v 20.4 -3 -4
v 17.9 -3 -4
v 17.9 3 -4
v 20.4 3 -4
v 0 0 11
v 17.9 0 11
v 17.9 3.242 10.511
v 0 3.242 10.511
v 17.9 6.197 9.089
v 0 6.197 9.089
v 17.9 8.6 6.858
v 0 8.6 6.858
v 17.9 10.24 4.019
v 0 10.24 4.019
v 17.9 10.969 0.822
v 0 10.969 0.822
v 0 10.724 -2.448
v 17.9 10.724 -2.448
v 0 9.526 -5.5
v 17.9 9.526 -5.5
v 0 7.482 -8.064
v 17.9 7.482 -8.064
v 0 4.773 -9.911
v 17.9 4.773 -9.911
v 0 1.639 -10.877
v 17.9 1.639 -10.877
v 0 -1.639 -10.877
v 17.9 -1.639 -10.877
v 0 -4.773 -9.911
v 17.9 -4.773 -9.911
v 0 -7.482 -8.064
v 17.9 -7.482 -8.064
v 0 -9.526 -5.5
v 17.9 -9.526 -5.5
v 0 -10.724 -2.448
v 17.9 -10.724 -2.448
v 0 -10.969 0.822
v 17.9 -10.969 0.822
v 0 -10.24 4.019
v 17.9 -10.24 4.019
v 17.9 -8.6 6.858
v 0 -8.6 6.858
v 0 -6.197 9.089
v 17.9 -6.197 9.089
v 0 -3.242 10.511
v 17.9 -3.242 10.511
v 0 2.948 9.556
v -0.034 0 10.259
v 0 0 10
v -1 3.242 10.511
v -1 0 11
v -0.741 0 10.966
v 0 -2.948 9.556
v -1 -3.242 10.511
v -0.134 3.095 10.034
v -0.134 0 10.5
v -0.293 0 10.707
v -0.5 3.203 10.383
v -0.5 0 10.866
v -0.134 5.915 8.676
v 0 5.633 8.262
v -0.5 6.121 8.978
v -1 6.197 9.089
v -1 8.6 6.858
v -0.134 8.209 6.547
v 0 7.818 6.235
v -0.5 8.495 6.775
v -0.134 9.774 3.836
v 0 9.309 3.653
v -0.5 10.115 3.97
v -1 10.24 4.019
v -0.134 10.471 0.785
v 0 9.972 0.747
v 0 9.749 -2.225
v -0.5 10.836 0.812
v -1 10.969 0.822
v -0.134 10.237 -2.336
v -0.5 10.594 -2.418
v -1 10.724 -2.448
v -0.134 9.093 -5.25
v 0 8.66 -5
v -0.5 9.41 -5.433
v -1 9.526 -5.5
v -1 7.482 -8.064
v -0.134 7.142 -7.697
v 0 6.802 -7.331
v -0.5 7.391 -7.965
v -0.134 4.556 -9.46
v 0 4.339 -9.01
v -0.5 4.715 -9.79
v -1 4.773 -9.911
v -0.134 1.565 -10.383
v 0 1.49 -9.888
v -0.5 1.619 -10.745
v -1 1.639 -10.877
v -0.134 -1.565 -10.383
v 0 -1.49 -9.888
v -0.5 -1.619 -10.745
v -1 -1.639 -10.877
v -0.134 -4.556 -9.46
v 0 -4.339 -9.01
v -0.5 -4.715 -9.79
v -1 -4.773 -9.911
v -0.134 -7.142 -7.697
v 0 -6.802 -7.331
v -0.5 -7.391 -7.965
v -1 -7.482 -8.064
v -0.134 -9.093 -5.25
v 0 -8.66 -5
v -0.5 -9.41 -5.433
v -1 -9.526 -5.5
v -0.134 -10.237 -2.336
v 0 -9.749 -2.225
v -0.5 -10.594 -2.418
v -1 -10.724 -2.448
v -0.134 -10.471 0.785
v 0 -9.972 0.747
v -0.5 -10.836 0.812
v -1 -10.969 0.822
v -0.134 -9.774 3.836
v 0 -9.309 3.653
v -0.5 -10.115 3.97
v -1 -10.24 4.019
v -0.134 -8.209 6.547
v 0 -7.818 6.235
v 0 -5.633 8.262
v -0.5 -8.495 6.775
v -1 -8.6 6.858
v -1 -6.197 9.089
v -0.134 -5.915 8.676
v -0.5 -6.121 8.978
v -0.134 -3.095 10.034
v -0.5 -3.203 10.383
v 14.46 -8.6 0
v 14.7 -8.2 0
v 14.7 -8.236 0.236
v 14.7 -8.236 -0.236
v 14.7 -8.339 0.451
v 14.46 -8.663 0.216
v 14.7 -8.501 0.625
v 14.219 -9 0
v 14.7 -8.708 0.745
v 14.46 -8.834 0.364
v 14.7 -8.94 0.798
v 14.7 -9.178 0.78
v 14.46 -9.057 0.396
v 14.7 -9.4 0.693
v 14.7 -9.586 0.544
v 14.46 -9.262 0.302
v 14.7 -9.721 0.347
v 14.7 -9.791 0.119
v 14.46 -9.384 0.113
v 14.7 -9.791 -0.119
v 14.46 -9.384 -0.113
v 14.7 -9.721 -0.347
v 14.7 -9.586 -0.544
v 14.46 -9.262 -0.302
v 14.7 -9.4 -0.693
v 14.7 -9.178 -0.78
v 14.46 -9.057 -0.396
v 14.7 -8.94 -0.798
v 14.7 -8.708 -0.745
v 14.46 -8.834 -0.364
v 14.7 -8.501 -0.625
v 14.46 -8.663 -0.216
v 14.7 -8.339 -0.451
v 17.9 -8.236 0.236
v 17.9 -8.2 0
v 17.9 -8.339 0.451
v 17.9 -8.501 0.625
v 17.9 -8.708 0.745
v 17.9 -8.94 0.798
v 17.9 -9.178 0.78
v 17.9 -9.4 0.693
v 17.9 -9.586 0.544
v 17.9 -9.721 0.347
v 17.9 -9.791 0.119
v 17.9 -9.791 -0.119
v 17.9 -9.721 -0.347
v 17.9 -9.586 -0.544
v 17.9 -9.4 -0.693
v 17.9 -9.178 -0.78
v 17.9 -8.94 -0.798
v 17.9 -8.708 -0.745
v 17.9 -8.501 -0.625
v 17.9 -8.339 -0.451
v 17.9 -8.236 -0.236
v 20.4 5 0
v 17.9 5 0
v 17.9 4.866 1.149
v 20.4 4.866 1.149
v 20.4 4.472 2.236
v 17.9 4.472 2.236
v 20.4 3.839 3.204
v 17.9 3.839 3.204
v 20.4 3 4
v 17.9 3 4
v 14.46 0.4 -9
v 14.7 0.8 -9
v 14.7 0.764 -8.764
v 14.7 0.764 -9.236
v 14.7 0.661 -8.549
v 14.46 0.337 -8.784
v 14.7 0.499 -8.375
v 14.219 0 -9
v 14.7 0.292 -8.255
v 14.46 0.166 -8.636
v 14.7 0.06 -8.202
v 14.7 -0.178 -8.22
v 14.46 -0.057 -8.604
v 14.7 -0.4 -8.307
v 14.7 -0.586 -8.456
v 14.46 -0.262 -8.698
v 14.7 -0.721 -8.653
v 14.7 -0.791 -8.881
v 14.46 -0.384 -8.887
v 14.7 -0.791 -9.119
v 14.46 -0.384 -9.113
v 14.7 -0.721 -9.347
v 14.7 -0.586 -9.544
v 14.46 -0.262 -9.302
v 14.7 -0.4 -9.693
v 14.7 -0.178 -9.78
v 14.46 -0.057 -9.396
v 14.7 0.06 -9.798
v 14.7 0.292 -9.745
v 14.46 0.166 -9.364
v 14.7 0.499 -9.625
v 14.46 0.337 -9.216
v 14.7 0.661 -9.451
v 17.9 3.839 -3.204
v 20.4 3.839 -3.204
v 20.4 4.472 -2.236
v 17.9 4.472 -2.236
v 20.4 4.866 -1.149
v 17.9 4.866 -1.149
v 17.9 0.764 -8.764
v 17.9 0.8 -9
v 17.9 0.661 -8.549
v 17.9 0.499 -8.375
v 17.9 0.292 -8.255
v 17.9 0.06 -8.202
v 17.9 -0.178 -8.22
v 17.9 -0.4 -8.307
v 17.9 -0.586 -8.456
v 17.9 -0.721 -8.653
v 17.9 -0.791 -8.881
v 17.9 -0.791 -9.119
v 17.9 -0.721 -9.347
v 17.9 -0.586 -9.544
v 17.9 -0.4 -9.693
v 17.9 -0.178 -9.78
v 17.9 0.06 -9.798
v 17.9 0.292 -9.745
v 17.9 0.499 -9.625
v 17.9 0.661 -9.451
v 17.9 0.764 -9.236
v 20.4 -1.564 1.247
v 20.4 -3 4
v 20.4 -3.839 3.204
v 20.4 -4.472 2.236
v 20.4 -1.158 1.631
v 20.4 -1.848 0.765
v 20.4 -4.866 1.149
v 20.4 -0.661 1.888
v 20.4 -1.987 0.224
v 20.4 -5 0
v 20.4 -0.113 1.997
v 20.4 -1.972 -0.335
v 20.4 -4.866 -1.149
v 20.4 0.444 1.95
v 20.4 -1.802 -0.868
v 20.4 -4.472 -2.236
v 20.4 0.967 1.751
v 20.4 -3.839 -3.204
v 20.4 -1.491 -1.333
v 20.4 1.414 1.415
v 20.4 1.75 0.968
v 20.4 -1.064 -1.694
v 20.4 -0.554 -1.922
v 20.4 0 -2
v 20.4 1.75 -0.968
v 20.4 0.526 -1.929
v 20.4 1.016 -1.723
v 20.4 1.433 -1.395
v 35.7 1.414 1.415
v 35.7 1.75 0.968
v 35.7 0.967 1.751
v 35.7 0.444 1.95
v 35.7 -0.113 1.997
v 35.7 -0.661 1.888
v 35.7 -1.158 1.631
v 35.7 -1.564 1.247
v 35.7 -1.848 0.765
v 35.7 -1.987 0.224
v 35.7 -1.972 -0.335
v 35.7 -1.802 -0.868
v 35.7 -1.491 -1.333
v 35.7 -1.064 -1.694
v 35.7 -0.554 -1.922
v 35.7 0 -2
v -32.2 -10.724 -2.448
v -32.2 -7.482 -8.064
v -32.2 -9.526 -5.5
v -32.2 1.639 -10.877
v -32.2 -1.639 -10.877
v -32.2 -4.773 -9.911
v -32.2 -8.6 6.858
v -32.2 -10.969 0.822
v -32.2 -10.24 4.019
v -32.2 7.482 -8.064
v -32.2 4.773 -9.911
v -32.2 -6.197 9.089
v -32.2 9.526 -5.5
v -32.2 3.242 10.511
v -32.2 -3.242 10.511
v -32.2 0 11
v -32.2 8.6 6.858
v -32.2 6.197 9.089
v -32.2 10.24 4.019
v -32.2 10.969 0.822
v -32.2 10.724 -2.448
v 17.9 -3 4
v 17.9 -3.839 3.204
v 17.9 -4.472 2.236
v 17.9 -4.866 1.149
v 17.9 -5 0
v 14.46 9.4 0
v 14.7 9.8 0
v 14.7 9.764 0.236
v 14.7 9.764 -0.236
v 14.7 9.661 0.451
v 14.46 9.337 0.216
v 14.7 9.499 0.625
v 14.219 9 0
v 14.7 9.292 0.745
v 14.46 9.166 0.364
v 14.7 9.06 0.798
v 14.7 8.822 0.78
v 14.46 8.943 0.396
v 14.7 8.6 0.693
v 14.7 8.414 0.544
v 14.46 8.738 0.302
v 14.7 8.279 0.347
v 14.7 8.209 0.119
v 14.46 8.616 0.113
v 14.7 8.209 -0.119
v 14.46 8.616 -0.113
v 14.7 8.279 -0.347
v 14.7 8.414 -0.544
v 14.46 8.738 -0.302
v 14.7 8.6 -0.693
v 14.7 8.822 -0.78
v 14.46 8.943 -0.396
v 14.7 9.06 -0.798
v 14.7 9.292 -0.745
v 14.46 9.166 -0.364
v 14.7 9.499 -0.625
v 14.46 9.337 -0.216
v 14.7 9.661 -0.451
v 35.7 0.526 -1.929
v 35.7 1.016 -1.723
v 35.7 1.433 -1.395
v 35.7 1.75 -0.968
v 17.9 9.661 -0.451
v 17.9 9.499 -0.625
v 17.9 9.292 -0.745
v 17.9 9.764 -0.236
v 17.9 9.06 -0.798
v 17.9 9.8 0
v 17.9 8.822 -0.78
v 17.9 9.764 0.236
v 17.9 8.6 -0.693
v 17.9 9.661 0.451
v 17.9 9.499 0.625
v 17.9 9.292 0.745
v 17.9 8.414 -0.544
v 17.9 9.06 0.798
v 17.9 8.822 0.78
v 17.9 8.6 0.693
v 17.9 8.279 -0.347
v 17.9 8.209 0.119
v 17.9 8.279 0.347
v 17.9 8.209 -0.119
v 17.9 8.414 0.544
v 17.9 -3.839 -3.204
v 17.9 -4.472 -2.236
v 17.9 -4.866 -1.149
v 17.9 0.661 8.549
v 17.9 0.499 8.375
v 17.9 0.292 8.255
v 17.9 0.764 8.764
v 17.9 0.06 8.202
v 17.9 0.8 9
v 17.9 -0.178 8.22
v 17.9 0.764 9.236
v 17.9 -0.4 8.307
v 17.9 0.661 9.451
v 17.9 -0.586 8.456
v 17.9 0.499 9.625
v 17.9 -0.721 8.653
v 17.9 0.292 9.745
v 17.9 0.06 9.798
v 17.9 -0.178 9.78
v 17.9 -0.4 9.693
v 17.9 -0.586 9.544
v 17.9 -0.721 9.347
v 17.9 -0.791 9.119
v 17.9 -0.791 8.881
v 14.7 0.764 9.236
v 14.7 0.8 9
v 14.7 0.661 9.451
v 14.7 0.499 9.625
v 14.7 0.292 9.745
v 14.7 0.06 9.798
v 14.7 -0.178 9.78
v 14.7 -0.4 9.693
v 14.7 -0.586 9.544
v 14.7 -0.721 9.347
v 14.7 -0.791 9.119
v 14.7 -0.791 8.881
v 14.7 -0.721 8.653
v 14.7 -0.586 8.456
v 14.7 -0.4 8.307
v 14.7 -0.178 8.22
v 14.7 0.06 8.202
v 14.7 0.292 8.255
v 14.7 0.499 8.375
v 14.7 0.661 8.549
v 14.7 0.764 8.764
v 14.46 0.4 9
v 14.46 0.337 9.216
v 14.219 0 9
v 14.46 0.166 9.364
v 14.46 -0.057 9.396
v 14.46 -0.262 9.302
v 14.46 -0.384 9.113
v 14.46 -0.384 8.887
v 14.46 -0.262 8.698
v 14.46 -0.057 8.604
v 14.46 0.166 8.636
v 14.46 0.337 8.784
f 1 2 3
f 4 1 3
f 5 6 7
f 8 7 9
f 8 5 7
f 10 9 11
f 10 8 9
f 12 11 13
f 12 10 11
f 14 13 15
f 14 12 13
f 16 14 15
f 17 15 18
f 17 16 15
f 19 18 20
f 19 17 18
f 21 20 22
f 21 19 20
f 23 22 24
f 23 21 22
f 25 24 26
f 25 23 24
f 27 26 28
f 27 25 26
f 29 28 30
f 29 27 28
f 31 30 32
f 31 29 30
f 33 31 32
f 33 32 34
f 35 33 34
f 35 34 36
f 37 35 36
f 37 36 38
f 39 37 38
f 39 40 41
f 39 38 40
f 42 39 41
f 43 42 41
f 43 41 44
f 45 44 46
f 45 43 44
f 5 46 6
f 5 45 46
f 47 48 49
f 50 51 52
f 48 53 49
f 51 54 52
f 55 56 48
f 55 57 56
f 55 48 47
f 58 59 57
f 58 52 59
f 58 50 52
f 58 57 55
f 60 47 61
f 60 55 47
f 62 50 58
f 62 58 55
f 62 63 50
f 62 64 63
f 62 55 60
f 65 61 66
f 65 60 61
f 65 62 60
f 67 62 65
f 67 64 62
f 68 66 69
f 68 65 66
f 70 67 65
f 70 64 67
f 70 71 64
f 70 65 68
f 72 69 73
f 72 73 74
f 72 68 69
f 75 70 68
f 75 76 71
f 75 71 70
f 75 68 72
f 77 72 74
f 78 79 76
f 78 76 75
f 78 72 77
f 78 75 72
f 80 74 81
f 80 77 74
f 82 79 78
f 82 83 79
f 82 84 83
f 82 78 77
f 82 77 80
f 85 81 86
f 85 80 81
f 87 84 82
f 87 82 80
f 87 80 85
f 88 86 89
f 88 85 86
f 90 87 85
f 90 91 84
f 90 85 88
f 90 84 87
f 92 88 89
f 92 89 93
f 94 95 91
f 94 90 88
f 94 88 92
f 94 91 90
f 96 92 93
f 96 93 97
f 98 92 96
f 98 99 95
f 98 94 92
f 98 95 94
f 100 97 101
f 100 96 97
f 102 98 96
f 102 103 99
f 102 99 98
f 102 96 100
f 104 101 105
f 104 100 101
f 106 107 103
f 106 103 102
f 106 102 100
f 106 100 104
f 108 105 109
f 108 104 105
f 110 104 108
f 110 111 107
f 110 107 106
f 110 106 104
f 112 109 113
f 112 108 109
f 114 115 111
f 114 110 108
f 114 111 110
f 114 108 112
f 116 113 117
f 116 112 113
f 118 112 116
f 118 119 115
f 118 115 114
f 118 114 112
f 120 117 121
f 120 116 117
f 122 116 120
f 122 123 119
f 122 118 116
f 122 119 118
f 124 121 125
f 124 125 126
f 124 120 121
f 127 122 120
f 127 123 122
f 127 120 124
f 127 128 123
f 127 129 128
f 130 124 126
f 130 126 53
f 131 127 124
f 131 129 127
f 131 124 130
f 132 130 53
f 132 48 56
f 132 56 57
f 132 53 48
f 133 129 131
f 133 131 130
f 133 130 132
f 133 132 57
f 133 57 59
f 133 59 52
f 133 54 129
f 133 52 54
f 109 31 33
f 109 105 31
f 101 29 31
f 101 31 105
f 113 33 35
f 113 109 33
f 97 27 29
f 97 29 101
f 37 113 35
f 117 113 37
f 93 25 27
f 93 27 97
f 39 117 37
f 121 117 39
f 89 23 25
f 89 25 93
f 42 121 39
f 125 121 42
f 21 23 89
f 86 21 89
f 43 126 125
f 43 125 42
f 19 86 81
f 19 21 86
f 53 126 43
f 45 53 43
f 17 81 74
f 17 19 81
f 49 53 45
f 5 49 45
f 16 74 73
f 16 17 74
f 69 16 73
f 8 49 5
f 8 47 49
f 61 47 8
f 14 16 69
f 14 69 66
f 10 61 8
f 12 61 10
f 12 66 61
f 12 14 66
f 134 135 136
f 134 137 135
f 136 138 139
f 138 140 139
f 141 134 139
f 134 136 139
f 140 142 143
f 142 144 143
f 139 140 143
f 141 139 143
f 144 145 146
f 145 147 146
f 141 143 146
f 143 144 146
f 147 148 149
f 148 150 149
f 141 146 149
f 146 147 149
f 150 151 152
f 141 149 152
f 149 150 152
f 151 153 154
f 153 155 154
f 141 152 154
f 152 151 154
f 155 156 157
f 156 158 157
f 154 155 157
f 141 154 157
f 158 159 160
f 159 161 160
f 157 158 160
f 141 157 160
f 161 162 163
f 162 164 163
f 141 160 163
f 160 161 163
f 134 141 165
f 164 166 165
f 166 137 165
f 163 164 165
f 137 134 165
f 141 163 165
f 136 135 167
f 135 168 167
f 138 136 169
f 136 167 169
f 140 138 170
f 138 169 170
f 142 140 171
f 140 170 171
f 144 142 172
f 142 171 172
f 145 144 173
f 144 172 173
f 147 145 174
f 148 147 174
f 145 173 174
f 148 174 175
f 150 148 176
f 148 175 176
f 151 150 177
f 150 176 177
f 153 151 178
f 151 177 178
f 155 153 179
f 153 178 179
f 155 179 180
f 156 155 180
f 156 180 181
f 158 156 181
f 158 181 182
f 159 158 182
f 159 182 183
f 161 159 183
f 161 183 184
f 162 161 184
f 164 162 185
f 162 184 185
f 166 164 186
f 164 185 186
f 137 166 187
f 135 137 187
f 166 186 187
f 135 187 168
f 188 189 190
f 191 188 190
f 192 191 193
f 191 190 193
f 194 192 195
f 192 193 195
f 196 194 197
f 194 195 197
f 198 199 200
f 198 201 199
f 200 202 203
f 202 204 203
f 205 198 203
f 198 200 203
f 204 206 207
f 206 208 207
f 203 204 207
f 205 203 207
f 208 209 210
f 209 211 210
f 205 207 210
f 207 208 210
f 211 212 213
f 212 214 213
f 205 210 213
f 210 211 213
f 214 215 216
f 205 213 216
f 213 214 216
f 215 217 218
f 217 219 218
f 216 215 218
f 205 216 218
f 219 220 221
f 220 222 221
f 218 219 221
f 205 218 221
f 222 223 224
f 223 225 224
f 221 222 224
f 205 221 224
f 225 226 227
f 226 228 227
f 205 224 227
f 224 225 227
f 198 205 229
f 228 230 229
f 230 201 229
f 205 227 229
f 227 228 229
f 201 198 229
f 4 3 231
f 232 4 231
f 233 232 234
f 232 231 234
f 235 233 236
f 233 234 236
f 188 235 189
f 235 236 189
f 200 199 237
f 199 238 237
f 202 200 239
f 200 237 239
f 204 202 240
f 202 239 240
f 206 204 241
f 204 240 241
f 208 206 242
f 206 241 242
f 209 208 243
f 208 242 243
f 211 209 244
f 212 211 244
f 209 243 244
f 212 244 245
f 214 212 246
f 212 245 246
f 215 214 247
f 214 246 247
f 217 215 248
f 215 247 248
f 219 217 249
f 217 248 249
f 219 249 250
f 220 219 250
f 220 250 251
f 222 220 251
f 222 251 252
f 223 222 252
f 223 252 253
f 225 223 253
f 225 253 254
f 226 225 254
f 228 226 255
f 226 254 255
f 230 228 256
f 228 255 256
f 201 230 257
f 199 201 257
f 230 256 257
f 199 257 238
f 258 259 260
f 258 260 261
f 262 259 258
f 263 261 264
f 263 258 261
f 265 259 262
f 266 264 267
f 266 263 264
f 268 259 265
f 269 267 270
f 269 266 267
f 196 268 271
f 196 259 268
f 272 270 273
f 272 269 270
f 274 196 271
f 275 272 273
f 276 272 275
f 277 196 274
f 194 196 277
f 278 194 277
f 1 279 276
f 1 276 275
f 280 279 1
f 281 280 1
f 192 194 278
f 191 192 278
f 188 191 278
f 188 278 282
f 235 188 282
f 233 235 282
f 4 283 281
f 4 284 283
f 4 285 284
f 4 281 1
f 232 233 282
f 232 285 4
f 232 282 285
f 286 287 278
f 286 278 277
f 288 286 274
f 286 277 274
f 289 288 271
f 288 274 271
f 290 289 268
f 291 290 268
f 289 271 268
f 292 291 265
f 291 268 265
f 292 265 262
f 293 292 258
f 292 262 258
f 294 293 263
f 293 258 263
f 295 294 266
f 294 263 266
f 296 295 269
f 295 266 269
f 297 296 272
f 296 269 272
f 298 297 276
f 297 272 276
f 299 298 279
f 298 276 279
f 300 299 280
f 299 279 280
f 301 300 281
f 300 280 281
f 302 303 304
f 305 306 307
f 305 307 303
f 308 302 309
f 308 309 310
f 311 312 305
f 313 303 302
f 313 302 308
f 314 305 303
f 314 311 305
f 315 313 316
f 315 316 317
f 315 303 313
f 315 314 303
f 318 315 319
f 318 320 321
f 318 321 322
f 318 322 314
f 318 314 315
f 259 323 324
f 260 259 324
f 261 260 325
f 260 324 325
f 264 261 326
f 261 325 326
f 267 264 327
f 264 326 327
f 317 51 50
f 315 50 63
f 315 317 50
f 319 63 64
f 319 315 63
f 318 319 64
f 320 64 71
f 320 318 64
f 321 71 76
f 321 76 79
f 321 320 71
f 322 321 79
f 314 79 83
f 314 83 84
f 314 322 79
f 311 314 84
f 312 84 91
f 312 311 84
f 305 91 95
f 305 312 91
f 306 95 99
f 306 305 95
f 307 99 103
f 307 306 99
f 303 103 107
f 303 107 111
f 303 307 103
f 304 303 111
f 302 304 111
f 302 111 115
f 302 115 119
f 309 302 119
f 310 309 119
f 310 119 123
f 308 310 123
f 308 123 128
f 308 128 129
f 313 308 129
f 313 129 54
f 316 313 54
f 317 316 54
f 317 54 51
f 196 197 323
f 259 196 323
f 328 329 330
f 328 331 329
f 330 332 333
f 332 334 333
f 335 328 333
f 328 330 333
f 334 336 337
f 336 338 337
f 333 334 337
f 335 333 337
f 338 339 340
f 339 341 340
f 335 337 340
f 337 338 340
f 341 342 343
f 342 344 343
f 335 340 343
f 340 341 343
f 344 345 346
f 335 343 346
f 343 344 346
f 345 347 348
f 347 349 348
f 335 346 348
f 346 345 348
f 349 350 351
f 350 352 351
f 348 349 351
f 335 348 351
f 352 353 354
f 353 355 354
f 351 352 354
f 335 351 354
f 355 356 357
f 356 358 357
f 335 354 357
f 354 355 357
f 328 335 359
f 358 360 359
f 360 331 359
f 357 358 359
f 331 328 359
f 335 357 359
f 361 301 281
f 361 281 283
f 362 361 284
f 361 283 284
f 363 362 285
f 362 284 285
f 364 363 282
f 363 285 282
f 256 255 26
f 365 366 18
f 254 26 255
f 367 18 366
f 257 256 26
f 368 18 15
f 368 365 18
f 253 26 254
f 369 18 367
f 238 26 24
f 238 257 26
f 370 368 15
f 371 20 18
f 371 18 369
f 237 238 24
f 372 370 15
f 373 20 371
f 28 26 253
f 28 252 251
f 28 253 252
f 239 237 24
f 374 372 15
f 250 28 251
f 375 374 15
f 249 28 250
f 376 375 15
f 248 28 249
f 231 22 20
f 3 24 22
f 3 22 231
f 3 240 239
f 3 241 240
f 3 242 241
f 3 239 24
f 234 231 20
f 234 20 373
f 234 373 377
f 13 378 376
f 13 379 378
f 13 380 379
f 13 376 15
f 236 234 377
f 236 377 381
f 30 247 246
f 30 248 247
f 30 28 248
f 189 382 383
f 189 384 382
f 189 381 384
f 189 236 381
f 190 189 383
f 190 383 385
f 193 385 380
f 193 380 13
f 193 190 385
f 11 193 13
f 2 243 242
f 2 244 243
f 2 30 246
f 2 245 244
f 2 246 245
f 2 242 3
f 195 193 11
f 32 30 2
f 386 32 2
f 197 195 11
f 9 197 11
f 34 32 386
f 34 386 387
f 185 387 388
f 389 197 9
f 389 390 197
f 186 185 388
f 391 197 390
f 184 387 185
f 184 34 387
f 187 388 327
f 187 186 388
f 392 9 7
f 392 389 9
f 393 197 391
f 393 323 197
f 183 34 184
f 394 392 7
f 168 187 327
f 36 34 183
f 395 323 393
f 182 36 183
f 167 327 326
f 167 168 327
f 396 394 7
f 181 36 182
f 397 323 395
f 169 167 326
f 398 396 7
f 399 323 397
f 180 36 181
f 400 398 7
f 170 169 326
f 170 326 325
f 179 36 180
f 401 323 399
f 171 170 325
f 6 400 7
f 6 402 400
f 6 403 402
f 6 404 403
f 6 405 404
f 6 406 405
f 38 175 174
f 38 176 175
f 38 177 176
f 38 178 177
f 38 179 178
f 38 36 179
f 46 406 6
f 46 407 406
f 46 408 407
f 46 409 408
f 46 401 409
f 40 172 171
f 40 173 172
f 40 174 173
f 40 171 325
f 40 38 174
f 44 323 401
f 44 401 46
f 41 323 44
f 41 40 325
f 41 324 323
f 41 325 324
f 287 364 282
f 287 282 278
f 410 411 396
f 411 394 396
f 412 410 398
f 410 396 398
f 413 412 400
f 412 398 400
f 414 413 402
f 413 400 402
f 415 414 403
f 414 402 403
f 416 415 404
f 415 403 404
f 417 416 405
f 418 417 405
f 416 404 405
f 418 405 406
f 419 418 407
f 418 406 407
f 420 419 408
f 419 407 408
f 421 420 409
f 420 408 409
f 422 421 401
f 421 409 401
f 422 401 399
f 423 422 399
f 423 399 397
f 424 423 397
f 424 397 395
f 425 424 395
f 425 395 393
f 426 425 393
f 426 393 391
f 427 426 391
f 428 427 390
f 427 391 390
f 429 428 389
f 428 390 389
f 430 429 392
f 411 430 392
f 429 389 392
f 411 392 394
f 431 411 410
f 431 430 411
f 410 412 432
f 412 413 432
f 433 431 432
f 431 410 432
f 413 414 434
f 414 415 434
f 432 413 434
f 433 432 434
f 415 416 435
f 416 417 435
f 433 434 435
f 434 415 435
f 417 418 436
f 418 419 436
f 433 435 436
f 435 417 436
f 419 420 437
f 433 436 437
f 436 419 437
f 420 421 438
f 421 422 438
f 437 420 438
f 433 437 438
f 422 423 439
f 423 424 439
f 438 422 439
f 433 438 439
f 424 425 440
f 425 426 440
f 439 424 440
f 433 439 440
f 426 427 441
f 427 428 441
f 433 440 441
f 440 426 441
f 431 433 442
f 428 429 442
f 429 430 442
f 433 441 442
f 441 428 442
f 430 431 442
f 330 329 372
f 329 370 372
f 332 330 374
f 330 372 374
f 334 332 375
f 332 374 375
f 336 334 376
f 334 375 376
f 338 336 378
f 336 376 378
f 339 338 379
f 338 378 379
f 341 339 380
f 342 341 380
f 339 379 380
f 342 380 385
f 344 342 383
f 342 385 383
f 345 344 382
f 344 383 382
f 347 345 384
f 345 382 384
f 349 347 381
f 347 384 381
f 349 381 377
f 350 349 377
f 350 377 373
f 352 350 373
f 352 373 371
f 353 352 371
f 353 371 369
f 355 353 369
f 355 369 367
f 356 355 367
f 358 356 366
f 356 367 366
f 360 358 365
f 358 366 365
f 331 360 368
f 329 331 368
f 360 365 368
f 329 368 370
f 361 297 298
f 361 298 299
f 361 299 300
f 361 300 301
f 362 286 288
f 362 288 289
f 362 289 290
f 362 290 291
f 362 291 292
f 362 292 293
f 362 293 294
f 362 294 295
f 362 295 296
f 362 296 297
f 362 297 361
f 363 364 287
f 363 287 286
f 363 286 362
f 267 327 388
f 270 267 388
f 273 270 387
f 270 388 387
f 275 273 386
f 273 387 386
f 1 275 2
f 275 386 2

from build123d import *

# Parameters (mm, degrees)
SKETCH1_R           = 11
BOSS_EXTRUDE1_DEPTH = 17.9
BOSS_EXTRUDE2_START = 32.2
SKETCH2_R           = 11
BOSS_EXTRUDE2_DEPTH = 32.2
BOSS_EXTRUDE3_DEPTH = 2.5
BOSS_EXTRUDE4_DEPTH = 15.3


# Read off the part's stored shape, not the designer's step: AdvancedHole1
with BuildPart() as part:
    # Sketch1 → Boss-Extrude1 (new body)
    with BuildSketch(Plane(origin=(0, 0, 0), x_dir=(0, 0, -1), z_dir=(1, 0, 0))):
        with Locations(Location((0, 0, 0), (0, 0, 180))):
            Circle(SKETCH1_R)
    extrude(amount=BOSS_EXTRUDE1_DEPTH)

    # Sketch2 → Boss-Extrude2 (add)
    with BuildSketch(Plane.ZY.offset(BOSS_EXTRUDE2_START)):
        Circle(SKETCH2_R)
    extrude(amount=-BOSS_EXTRUDE2_DEPTH)

    # Sketch3 → Cut-Revolve1 (revolve, cut)
    with BuildSketch(Plane.XY, mode=Mode.PRIVATE) as cut_revolve1_sk:
        with BuildLine():
            Line((0, 11), (0, 10))
            ThreePointArc((0, 10), (-0.292893219, 10.707106781), (-1, 11))
            Line((-1, 11), (0, 11))
        make_face()
    revolve(cut_revolve1_sk.sketch.rotate(Axis((17.9, 0, 0), (-1, 0, 0)), 270), axis=Axis((17.9, 0, 0), (-1, 0, 0)), mode=Mode.SUBTRACT)

    # Sketch4 → Boss-Extrude3 (add)
    with BuildSketch(Plane(origin=(17.9, 0, 0), x_dir=(0, 0, -1), z_dir=(1, 0, 0))):
        with BuildLine():
            ThreePointArc((4, 3), (2.236067977, 4.472135955), (0, 5))
            Line((0, 5), (0, -5))
            ThreePointArc((0, -5), (2.236067977, -4.472135955), (4, -3))
            Line((4, -3), (4, 3))
        make_face()
        with BuildLine():
            ThreePointArc((0, 5), (-2.236067977, 4.472135955), (-4, 3))
            Line((-4, 3), (-4, -3))
            ThreePointArc((-4, -3), (-2.236067977, -4.472135955), (0, -5))
            Line((0, -5), (0, 5))
        make_face()
    extrude(amount=BOSS_EXTRUDE3_DEPTH)

    # Sketch5 → Boss-Extrude4 (add)
    with BuildSketch(Plane(origin=(20.4, 0, 0), x_dir=(0, 0, -1), z_dir=(1, 0, 0))):
        with BuildLine():
            Line((0.968245837, 1.75), (-0.968245837, 1.75))
            ThreePointArc((-0.968245837, 1.75), (-1.015753003, -1.722859784), (2, 0))
            ThreePointArc((2, 0), (1.722859784, 1.015753003), (0.968245837, 1.75))
        make_face()
    extrude(amount=BOSS_EXTRUDE4_DEPTH)

    # AdvancedHole1 outline → AdvancedHole1 (revolve, cut)
    with BuildSketch(Plane(origin=(0, -9, 0), x_dir=(0, 1, 0), z_dir=(0, 0, -1))):
        Polygon((0, 14.219311505), (0.8, 14.7), (0.8, 17.9), (0, 17.9), align=None)
    revolve(axis=Axis((0, -9, 0), (1, 0, 0)), mode=Mode.SUBTRACT)

    # AdvancedHole1 2 outline → AdvancedHole1 2 (revolve, cut)
    with BuildSketch(Plane.YX.offset(9)):
        Polygon((0, 14.219311505), (0.8, 14.7), (0.8, 17.9), (0, 17.9), align=None)
    revolve(axis=Axis((0, 0, -9), (1, 0, 0)), mode=Mode.SUBTRACT)

    # AdvancedHole1 3 outline → AdvancedHole1 3 (revolve, cut)
    with BuildSketch(Plane.YX.offset(-9)):
        Polygon((0, 14.219311505), (0.8, 14.7), (0.8, 17.9), (0, 17.9), align=None)
    revolve(axis=Axis((0, 0, 9), (1, 0, 0)), mode=Mode.SUBTRACT)

    # AdvancedHole1 4 outline → AdvancedHole1 4 (revolve, cut)
    with BuildSketch(Plane(origin=(0, 9, 0), x_dir=(0, 1, 0), z_dir=(0, 0, -1))):
        Polygon((0, 14.219311505), (0.8, 14.7), (0.8, 17.9), (0, 17.9), align=None)
    revolve(axis=Axis((0, 9, 0), (1, 0, 0)), mode=Mode.SUBTRACT)


solid = part.part
